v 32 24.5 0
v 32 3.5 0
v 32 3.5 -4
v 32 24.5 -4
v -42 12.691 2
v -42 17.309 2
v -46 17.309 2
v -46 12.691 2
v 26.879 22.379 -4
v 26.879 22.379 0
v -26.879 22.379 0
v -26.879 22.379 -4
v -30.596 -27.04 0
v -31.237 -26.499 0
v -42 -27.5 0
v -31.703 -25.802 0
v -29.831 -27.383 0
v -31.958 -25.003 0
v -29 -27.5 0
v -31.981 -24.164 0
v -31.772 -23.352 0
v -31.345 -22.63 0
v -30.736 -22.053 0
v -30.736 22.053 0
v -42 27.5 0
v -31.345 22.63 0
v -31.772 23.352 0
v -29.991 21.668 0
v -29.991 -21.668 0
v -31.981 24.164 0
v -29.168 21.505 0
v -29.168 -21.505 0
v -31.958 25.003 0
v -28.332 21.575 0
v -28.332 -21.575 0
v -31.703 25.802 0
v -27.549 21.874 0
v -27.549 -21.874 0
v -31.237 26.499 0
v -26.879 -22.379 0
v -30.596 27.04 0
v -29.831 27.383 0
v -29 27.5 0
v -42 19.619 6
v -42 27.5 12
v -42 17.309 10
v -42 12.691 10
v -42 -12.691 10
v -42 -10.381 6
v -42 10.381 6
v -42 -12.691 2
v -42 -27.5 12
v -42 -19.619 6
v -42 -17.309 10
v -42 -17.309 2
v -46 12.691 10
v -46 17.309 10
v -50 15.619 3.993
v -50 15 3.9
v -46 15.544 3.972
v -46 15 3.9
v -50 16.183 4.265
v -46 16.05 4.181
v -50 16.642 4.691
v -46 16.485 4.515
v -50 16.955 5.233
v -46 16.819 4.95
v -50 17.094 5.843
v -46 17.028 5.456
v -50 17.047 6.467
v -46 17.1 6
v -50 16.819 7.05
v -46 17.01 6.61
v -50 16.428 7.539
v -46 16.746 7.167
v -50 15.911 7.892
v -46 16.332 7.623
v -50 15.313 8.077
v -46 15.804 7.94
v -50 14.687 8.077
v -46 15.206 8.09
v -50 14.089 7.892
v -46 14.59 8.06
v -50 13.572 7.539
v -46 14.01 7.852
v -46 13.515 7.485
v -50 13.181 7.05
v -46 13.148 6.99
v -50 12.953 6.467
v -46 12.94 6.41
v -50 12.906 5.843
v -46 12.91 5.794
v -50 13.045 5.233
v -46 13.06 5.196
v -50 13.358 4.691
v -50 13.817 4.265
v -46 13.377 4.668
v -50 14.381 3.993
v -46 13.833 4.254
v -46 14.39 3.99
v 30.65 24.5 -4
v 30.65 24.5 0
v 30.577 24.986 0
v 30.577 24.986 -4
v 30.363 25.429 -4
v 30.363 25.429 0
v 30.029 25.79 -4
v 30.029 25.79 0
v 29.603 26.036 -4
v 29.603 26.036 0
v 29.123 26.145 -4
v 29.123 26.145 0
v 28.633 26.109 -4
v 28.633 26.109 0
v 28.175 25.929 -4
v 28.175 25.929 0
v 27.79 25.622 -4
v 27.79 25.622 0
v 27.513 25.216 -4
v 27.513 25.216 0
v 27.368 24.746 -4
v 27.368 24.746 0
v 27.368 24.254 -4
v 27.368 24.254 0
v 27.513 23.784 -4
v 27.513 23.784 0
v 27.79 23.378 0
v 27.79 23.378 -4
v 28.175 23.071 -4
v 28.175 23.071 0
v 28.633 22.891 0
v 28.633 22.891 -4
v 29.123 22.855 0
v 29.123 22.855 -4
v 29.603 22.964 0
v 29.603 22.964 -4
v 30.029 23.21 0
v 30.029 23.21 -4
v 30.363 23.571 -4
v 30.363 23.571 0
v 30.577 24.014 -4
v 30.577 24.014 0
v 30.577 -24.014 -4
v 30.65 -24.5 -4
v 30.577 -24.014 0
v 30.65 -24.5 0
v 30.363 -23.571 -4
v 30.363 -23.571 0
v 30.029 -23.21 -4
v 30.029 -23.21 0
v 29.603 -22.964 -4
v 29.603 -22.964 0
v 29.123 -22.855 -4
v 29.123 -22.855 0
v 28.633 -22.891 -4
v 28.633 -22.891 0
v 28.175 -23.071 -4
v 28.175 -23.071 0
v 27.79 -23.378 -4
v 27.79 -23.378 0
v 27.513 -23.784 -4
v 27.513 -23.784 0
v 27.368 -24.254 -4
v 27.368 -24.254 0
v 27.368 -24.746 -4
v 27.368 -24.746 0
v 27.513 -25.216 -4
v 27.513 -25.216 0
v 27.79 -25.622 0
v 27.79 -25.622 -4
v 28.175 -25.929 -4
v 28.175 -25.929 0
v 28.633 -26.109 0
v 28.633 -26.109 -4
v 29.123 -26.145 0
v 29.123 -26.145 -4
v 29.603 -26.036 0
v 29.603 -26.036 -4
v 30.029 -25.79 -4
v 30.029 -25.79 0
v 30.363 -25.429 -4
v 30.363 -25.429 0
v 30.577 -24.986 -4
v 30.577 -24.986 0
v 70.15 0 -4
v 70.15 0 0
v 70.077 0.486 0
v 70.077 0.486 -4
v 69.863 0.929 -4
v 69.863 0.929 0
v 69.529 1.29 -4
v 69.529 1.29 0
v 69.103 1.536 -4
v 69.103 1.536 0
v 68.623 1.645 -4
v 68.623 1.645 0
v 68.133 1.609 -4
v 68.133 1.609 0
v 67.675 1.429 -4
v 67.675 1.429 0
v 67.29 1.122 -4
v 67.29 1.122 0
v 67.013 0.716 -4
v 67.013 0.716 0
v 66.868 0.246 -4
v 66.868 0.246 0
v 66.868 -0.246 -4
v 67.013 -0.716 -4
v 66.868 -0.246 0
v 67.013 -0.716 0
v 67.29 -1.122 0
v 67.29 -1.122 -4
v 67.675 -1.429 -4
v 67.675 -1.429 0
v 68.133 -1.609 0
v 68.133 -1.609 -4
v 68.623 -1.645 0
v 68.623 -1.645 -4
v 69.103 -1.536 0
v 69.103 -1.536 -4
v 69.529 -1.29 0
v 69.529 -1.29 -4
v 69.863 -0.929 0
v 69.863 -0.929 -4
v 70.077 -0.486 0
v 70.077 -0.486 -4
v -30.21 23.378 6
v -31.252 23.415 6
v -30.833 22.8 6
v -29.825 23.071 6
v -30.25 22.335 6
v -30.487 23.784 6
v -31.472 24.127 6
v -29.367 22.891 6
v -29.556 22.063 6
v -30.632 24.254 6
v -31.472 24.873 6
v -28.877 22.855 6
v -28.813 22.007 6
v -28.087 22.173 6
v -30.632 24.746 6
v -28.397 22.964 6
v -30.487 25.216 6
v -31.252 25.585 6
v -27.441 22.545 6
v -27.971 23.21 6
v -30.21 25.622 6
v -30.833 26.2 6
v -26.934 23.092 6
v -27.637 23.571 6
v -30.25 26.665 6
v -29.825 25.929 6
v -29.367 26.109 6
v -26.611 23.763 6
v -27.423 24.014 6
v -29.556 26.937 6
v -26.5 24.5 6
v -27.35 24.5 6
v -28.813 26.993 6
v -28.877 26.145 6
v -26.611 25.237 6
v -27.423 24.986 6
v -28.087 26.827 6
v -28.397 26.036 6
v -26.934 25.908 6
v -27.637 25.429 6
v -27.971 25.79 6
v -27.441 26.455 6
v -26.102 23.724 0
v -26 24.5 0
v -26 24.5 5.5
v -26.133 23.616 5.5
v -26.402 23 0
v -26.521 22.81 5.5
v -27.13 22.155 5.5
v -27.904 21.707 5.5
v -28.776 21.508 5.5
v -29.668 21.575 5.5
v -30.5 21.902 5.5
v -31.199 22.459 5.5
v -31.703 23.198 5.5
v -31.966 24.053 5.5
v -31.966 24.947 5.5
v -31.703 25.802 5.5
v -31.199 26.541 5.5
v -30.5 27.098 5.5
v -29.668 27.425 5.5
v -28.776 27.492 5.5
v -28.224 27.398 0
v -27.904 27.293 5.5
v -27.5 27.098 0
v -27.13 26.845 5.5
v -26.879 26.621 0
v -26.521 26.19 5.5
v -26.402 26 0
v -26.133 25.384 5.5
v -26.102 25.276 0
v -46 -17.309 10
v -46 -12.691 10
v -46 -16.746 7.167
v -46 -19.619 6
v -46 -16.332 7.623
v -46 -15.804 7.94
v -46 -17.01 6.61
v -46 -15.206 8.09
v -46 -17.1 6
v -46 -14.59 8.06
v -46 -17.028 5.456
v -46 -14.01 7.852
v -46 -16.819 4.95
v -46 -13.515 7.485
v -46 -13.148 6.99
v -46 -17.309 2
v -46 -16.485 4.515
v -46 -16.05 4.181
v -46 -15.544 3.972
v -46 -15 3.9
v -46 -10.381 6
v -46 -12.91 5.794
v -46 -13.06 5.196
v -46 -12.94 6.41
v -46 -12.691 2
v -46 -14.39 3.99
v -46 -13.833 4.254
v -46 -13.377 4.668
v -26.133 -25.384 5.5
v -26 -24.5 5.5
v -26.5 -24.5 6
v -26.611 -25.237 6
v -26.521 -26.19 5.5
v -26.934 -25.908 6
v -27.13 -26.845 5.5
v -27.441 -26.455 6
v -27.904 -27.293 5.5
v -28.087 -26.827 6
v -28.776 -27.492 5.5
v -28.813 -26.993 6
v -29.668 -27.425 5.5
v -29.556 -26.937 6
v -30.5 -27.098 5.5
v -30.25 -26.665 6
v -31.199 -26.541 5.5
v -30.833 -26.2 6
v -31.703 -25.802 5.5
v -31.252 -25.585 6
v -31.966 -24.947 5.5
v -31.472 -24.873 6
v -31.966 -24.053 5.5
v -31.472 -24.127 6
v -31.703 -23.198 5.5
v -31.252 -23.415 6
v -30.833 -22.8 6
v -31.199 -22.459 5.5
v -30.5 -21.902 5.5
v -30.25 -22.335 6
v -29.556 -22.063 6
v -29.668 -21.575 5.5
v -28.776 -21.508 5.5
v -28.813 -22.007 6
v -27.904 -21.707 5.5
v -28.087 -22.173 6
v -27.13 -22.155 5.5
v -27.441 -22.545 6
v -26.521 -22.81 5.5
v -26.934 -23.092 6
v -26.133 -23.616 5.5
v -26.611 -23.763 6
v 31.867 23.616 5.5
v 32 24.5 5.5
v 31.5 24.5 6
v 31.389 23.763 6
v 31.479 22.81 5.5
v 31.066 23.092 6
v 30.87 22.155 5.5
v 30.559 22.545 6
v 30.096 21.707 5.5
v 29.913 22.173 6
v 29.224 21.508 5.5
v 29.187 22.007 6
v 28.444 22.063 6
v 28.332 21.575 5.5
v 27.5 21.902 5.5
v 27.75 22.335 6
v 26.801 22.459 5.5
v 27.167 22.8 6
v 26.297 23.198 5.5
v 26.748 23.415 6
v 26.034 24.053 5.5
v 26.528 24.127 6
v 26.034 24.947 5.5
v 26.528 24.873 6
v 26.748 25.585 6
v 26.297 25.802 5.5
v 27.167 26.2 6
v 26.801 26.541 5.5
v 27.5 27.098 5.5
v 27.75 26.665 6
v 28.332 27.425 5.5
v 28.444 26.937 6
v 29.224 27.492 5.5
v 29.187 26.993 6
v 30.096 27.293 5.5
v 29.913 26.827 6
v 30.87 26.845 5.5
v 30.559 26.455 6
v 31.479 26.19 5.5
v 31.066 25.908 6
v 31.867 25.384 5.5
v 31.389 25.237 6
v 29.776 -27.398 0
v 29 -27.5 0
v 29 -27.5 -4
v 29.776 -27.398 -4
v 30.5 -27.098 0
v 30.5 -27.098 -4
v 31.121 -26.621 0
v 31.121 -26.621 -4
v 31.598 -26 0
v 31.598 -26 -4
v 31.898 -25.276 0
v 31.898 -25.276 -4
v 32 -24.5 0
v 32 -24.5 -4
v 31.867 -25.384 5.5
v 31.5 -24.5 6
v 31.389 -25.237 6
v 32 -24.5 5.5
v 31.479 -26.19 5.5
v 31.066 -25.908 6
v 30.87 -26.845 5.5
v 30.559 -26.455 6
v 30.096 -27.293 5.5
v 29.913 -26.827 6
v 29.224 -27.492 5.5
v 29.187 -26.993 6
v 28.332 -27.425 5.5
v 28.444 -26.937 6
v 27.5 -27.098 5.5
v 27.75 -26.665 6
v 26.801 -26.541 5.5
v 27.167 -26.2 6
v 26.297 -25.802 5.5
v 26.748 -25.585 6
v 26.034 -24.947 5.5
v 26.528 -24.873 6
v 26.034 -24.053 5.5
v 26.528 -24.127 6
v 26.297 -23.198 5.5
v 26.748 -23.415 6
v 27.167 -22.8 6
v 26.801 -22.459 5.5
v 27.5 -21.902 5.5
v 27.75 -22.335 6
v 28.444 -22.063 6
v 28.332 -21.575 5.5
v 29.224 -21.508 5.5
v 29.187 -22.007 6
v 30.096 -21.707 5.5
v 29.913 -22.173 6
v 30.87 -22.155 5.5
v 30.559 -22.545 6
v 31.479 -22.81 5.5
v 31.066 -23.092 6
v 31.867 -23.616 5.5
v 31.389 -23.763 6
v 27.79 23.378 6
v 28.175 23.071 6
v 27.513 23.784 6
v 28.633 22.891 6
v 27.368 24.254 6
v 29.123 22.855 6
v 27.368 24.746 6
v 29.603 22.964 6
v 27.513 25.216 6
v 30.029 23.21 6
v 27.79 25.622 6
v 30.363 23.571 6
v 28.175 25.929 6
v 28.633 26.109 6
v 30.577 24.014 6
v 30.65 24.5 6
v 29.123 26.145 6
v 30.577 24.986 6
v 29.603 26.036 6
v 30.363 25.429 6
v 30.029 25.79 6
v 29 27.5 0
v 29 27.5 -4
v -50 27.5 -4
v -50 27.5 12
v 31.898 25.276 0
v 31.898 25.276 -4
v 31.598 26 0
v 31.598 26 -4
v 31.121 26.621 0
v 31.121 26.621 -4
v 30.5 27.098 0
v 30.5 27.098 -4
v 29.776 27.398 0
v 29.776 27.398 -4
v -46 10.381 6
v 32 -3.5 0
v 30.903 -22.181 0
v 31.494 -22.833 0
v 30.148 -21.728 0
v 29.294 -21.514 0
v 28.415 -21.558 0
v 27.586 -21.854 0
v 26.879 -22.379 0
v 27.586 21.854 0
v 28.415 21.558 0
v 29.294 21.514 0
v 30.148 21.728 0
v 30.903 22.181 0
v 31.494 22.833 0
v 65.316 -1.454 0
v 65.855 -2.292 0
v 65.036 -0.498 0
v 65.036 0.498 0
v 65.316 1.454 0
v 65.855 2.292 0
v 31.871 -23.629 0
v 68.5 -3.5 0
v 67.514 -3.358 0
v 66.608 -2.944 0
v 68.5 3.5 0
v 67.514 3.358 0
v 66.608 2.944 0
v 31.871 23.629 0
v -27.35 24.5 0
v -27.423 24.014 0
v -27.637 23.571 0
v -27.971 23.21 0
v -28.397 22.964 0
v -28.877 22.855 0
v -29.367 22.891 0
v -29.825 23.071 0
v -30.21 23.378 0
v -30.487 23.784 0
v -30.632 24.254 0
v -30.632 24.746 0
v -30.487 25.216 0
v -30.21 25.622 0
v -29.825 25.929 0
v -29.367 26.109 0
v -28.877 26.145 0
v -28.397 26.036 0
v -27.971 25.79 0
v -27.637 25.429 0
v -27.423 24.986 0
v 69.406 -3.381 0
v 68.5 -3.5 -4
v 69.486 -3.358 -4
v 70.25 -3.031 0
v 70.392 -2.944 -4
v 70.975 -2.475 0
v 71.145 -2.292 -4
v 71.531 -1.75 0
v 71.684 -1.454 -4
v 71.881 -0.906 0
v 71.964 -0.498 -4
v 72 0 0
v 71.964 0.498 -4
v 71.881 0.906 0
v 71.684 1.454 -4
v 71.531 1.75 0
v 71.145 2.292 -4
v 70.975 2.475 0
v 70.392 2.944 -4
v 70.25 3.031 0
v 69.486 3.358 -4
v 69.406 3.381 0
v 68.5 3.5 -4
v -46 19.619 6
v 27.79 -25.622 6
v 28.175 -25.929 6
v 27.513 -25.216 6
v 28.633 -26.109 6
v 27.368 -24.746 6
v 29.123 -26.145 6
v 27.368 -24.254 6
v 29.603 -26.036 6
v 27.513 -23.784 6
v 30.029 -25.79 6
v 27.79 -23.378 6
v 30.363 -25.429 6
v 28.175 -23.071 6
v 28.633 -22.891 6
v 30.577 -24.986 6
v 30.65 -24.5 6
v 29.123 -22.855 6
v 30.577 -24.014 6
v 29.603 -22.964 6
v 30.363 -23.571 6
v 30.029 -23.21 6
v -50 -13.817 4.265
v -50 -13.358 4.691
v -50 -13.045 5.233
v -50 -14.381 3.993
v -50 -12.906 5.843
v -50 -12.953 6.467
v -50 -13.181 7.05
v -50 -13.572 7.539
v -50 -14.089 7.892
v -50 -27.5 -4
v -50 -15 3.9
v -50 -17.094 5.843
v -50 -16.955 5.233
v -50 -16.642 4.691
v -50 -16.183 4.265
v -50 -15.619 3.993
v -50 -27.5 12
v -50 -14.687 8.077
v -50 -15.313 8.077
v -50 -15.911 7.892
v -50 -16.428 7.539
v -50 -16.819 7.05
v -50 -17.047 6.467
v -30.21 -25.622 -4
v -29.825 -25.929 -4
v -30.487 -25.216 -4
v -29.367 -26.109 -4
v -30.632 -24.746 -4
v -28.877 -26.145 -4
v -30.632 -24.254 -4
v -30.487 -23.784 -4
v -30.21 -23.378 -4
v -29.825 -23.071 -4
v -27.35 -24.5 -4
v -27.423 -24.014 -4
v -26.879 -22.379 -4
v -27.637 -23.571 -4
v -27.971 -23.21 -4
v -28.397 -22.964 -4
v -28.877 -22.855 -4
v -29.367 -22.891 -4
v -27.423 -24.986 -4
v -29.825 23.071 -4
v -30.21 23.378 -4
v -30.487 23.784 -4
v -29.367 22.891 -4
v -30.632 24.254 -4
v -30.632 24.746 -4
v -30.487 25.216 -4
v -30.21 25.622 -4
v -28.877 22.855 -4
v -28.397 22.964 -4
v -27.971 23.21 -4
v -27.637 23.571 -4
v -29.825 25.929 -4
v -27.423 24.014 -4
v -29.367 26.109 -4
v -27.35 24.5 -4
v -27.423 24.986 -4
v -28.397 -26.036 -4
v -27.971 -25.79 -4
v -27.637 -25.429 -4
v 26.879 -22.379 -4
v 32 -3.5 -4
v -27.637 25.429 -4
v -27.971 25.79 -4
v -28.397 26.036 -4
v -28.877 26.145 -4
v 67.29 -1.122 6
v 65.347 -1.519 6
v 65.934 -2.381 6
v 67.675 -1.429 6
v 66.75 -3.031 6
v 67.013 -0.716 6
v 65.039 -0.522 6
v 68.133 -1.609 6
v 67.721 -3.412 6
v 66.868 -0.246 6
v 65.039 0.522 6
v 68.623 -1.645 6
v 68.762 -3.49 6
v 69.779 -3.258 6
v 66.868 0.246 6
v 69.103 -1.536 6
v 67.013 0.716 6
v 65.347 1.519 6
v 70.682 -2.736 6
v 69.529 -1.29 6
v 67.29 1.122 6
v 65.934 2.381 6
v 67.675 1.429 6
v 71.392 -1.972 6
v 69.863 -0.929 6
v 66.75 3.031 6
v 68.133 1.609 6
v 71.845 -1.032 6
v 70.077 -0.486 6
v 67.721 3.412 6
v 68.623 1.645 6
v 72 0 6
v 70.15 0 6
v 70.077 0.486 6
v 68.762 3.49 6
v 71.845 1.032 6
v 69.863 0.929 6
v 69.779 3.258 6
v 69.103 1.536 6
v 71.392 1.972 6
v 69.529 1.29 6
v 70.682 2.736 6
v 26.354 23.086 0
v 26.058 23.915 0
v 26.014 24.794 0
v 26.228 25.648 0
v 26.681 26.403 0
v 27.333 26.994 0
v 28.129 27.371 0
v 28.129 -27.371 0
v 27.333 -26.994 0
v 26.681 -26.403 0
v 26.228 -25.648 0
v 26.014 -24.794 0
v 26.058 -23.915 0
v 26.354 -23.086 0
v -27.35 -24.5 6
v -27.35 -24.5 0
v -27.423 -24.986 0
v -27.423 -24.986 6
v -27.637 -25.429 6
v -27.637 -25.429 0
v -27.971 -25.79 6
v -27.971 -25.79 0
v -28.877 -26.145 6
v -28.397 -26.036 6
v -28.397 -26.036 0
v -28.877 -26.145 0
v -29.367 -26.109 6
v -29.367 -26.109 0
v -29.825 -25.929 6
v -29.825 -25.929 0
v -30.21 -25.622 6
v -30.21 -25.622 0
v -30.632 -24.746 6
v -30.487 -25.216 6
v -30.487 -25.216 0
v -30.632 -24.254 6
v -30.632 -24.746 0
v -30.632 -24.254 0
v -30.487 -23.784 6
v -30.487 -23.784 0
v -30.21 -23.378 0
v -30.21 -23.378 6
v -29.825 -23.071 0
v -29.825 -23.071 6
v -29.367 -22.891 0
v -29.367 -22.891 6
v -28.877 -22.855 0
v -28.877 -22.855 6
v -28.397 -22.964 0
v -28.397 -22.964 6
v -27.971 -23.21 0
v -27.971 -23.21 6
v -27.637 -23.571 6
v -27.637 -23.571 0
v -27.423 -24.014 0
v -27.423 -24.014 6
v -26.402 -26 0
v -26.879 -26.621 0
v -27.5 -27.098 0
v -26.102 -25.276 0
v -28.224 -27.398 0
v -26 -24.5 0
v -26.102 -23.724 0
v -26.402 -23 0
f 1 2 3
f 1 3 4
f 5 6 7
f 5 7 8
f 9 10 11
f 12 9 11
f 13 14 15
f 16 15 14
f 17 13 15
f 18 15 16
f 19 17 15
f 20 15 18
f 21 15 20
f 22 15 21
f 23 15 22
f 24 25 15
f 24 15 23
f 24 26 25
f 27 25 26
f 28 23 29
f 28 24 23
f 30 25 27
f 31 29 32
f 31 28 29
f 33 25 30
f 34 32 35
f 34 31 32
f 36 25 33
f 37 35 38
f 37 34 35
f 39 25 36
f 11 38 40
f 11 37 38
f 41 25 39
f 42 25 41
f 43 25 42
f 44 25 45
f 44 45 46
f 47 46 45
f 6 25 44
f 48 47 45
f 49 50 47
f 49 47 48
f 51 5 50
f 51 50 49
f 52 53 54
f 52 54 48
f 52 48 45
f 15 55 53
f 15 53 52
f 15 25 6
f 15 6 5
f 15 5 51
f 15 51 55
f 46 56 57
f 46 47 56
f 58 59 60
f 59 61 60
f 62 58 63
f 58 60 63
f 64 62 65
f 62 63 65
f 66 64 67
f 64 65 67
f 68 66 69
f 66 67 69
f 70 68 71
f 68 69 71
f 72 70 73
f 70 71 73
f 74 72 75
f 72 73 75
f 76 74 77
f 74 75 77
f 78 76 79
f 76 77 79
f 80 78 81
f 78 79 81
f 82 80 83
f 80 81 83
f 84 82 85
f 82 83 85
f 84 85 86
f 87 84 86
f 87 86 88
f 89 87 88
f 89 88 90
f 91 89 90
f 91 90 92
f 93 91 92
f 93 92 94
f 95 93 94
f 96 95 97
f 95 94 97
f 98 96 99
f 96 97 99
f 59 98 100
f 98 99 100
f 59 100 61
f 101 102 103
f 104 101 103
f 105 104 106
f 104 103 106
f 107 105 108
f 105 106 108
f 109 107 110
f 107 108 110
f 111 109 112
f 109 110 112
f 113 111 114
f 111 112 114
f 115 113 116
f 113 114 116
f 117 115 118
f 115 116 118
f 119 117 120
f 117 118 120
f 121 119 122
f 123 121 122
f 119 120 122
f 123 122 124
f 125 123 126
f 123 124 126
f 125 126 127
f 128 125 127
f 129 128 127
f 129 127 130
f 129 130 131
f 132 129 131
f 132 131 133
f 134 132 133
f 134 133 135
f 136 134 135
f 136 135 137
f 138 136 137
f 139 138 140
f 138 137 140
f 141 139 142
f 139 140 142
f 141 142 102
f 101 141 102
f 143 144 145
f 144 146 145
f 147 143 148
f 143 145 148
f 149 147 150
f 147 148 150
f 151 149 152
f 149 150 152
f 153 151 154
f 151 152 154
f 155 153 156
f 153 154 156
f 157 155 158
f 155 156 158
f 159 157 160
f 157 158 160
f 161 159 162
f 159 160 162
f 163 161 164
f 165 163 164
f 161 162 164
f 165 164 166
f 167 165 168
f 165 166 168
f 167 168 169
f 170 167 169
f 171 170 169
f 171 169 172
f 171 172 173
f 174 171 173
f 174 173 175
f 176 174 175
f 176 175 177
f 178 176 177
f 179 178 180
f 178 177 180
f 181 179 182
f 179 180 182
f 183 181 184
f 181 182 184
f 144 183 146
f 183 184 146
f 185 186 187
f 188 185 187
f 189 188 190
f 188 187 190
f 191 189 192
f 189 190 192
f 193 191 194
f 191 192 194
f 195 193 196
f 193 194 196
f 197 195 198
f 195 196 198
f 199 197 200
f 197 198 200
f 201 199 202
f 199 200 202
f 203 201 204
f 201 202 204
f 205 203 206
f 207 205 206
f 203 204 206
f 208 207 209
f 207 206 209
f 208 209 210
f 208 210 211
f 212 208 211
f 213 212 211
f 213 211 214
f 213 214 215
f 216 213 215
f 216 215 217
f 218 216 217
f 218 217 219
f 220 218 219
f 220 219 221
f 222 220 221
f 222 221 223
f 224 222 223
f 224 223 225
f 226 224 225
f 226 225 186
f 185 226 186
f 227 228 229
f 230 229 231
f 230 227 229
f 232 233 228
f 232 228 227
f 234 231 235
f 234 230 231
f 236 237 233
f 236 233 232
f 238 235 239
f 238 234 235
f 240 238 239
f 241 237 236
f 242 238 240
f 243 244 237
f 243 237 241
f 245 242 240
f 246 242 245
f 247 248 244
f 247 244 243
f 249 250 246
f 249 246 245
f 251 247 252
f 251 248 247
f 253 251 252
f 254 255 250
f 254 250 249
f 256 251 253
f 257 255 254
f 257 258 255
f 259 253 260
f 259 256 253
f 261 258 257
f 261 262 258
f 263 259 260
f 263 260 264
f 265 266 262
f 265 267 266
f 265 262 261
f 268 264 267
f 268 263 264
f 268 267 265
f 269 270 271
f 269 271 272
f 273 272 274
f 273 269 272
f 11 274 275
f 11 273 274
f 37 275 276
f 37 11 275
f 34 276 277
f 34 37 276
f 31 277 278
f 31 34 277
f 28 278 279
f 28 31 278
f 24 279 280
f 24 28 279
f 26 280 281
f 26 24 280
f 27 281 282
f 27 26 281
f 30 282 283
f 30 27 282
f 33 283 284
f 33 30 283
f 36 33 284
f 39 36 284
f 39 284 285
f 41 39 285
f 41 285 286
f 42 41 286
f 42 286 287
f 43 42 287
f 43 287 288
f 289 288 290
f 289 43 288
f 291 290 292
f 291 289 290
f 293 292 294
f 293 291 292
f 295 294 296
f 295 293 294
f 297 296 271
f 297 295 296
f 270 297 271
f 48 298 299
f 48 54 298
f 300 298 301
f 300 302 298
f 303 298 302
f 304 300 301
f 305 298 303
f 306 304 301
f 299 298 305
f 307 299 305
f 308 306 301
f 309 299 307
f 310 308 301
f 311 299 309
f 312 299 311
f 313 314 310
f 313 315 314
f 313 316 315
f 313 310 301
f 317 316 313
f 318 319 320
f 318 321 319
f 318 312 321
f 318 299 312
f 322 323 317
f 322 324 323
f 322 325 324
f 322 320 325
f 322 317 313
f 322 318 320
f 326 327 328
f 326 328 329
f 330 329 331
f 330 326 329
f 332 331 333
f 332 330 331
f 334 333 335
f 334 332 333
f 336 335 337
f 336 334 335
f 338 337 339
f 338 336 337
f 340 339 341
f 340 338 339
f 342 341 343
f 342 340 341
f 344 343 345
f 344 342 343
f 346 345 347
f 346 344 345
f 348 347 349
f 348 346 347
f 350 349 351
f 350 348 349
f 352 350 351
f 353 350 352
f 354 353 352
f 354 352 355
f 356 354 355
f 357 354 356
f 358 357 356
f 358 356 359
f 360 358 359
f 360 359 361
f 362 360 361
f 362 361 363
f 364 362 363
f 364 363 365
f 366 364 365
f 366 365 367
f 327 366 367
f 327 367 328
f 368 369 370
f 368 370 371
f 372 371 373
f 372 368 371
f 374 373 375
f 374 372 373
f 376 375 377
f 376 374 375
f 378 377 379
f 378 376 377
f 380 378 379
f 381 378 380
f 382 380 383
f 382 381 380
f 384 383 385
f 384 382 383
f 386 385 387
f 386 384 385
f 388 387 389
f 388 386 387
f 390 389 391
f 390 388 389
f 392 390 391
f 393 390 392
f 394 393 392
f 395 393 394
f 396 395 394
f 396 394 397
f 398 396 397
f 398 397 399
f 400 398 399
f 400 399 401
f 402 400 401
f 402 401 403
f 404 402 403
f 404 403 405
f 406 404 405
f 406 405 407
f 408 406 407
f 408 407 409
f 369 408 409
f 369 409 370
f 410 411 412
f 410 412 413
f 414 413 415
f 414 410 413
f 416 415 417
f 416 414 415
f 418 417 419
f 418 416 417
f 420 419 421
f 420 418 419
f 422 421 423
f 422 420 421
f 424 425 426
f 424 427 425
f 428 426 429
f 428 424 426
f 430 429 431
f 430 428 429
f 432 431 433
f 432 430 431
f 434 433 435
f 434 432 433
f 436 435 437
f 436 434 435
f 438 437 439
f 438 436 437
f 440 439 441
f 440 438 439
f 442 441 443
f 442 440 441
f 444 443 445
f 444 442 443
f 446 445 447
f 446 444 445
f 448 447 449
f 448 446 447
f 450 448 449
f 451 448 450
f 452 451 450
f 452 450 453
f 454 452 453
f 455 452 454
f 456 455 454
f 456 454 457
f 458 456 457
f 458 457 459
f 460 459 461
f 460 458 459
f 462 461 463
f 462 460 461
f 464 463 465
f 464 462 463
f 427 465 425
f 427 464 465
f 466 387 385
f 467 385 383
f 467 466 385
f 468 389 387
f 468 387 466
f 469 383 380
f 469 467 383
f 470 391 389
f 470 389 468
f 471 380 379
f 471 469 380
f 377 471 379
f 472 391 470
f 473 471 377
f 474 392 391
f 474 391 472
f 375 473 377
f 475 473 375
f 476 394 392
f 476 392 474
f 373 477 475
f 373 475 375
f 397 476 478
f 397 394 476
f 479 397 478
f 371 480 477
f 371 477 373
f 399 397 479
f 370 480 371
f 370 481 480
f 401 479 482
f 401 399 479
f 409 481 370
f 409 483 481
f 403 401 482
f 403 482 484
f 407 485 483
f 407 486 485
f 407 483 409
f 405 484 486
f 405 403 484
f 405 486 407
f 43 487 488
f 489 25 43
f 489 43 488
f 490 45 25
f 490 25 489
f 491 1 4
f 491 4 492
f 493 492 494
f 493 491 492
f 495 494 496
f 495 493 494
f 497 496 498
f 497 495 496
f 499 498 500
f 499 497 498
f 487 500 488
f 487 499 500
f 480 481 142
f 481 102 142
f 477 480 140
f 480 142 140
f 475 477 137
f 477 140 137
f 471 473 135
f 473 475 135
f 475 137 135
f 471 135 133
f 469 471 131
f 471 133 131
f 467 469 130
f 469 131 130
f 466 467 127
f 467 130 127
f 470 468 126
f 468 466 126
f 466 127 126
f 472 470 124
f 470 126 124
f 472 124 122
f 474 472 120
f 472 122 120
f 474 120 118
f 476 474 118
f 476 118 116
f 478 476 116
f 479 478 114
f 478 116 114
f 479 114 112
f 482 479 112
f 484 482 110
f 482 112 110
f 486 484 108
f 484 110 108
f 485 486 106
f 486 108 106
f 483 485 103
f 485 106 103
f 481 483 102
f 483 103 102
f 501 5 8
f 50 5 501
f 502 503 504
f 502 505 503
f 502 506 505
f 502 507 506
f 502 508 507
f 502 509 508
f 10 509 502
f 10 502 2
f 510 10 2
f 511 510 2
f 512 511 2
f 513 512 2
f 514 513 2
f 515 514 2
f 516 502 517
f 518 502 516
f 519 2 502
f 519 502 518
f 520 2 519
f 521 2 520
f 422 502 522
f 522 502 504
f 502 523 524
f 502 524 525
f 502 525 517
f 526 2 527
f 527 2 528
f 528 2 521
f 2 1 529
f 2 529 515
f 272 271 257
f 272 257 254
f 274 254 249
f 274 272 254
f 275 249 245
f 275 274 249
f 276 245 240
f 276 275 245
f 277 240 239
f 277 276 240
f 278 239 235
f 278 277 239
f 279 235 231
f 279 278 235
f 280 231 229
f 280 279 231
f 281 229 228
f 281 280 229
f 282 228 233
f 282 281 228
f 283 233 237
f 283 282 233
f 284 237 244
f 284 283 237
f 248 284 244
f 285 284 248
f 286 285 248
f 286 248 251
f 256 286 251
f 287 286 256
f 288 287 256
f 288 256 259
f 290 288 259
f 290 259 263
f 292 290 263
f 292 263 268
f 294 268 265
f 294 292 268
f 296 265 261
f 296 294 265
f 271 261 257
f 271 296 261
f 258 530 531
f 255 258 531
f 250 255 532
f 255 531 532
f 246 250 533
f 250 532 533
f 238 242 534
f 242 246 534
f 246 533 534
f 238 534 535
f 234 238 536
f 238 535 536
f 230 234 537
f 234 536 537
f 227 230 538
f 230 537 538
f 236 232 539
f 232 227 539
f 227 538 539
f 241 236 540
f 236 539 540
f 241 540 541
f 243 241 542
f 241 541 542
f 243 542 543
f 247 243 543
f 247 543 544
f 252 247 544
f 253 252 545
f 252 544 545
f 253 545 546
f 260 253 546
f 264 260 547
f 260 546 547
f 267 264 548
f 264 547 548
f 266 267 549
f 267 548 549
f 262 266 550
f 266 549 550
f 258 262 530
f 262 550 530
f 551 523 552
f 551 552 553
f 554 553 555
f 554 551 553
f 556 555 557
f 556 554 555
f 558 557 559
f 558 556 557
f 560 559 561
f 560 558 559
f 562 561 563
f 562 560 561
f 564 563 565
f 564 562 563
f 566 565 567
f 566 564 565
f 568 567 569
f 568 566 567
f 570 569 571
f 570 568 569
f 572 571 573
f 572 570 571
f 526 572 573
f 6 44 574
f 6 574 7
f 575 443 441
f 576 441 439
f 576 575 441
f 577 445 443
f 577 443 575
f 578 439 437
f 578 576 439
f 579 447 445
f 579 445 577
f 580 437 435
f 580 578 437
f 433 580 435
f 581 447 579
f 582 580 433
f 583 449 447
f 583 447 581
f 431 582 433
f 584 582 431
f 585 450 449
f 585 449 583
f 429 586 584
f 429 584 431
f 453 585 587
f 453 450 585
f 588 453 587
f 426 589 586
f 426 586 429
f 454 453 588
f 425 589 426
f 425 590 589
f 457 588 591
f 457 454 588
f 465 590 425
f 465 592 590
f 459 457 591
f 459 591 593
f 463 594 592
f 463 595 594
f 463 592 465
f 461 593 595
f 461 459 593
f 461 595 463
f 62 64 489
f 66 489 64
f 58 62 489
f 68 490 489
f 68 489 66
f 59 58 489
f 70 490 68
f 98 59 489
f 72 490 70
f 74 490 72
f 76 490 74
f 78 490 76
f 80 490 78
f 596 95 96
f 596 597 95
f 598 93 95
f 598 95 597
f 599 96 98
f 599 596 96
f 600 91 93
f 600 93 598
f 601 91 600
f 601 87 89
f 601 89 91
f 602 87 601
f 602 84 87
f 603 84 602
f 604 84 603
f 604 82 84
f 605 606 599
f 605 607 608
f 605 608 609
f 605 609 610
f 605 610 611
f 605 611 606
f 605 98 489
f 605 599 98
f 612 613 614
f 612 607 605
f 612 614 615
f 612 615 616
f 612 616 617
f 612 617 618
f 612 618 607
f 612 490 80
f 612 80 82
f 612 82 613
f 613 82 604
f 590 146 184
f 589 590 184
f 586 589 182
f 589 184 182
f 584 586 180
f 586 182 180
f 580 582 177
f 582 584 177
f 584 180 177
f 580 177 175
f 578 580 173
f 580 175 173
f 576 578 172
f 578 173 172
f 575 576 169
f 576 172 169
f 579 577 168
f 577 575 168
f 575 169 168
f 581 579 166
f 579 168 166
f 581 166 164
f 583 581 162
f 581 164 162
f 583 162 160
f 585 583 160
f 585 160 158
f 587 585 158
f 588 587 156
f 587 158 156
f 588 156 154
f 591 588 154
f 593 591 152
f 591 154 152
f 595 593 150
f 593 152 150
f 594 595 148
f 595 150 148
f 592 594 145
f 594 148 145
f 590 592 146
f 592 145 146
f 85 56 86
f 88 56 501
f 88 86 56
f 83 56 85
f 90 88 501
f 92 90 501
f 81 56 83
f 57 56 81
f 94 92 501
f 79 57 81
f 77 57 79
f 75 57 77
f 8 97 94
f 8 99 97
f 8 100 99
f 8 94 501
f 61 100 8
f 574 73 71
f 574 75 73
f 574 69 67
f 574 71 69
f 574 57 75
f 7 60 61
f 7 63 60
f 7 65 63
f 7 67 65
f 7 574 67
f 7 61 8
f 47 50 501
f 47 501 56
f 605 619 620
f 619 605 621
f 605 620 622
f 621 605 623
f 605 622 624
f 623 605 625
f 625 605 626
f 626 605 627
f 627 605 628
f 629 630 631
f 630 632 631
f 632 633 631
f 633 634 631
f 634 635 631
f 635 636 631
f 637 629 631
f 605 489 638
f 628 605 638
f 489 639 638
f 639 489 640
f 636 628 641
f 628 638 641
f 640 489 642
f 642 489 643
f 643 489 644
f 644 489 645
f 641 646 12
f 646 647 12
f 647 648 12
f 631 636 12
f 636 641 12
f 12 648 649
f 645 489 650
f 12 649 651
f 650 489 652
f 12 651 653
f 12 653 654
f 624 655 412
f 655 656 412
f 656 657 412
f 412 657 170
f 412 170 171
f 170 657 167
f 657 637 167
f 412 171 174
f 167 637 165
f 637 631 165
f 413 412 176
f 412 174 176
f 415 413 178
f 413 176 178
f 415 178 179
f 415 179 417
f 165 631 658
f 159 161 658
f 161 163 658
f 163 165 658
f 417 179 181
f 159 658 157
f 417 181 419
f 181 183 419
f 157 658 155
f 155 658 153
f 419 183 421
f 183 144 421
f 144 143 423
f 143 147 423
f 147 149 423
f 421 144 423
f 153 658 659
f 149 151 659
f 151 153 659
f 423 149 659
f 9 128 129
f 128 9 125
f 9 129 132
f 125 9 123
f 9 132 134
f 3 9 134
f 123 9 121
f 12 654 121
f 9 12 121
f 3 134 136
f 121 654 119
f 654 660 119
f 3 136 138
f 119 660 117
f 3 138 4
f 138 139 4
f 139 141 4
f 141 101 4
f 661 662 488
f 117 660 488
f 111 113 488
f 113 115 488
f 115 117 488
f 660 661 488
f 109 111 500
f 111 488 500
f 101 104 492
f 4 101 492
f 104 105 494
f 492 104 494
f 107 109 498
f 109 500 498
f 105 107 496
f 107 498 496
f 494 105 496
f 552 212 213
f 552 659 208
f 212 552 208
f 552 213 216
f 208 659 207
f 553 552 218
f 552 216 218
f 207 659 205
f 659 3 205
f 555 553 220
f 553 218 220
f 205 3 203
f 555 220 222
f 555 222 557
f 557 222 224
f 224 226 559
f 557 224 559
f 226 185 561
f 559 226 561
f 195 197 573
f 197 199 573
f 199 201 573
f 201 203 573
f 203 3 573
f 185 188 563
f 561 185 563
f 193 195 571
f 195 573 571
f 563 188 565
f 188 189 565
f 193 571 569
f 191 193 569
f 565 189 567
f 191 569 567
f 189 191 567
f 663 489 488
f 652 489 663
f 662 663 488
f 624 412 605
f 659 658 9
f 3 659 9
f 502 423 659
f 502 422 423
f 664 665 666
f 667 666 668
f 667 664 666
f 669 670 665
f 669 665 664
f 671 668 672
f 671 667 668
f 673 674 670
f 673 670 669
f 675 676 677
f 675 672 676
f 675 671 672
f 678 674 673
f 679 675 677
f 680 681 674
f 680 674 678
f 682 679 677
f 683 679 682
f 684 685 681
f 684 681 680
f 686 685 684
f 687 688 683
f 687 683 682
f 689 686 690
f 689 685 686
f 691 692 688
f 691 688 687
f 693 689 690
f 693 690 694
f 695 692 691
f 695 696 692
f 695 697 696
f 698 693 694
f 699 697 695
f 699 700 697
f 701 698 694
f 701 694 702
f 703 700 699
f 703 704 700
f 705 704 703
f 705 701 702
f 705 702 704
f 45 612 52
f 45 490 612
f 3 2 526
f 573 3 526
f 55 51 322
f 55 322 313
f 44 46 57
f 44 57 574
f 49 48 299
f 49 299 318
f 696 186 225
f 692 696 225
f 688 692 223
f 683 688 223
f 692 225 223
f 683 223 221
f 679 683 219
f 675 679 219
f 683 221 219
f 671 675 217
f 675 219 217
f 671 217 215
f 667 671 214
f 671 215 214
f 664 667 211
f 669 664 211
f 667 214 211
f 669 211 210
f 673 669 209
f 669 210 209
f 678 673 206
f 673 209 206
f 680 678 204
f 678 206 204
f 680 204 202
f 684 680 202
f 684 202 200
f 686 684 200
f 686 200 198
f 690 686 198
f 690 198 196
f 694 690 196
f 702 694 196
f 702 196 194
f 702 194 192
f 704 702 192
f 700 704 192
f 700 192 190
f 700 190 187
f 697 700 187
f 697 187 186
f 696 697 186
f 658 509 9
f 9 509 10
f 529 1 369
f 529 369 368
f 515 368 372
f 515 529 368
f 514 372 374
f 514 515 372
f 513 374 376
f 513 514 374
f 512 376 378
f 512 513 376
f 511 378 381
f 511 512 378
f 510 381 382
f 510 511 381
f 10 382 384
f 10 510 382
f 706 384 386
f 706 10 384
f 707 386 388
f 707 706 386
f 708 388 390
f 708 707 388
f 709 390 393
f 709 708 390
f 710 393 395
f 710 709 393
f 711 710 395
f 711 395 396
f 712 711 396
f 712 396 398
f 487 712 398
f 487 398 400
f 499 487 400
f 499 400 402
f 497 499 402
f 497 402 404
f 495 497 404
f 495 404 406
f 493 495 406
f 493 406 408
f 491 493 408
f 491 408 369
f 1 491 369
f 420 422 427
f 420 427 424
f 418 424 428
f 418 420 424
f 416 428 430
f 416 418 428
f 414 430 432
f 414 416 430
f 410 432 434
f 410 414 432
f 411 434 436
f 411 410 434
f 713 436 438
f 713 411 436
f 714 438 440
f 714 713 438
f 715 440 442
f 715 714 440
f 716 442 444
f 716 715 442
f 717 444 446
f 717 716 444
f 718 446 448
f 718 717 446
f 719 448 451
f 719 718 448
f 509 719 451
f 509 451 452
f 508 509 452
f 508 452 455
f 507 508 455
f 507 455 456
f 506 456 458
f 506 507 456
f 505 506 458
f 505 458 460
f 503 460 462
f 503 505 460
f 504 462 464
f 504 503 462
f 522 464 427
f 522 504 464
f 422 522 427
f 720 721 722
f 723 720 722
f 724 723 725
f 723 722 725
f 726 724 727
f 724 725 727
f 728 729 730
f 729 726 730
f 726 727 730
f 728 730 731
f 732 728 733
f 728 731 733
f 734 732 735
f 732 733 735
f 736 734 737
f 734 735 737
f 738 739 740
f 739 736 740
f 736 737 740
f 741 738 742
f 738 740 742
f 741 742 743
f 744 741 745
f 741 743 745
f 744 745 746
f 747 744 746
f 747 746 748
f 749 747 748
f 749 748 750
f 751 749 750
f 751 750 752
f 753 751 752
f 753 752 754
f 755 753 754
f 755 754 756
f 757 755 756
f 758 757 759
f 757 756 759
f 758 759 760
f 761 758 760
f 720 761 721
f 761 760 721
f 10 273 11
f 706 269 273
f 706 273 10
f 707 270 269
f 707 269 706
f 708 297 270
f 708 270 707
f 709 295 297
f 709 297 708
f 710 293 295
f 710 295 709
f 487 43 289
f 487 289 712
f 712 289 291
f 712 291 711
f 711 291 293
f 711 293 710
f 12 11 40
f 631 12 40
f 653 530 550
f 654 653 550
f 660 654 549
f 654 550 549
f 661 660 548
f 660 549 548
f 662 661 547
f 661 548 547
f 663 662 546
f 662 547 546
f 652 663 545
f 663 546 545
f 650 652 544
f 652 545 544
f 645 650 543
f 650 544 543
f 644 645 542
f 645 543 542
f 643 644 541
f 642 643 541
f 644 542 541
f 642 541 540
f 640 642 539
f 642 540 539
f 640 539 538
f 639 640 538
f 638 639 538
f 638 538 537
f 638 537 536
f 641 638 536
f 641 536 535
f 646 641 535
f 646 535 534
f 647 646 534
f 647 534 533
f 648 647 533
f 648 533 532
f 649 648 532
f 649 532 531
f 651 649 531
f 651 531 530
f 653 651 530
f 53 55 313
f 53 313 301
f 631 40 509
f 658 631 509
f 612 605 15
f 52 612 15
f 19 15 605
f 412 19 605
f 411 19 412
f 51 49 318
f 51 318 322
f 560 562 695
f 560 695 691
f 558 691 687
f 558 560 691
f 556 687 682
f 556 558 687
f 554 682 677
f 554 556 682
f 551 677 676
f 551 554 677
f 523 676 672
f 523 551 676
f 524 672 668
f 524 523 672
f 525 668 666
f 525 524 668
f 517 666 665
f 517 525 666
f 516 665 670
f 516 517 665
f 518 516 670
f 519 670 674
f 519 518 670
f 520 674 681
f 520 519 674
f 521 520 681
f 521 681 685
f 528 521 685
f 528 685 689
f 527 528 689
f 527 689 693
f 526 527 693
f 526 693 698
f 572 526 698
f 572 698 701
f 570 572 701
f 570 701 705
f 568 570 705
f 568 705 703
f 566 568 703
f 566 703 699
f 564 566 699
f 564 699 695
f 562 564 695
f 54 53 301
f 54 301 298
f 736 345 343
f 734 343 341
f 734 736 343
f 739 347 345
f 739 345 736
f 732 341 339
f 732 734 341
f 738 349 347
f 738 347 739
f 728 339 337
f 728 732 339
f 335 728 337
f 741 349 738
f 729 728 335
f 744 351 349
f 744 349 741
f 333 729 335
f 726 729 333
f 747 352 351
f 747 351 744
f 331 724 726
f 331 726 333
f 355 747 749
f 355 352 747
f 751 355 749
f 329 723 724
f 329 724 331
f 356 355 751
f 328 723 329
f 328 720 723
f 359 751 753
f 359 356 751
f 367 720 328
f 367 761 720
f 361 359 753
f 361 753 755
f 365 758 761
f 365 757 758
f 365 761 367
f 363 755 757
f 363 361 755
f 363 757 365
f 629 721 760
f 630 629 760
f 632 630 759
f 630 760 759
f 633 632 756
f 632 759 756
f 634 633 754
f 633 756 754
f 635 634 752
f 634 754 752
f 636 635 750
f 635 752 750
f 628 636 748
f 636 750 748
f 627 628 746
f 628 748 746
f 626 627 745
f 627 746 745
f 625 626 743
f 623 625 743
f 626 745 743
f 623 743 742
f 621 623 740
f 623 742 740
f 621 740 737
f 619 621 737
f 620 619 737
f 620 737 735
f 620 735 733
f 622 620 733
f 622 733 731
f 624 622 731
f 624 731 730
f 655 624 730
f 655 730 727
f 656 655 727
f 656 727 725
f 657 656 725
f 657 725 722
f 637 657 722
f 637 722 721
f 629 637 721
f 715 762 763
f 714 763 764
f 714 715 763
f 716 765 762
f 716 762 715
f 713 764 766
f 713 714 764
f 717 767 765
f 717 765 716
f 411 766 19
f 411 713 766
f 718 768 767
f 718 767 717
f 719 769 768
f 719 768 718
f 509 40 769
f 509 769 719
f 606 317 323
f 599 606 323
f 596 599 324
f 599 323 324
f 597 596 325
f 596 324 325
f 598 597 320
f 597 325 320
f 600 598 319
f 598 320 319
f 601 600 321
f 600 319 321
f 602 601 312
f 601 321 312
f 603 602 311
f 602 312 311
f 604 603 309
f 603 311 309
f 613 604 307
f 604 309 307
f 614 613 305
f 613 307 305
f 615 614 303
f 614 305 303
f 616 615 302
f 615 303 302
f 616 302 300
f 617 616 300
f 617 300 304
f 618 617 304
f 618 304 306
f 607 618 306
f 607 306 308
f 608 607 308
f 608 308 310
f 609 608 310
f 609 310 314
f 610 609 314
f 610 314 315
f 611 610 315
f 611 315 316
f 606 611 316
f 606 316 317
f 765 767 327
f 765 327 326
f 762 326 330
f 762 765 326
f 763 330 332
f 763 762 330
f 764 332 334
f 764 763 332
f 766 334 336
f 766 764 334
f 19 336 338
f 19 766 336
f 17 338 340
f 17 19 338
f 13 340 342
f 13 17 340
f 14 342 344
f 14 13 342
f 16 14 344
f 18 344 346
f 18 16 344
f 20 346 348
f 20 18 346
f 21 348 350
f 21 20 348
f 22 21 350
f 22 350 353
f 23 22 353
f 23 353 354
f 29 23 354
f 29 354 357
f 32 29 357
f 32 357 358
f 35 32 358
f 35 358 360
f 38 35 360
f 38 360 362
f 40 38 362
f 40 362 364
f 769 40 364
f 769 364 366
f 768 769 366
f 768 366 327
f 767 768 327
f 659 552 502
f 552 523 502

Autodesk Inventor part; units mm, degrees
ref_plane "YZ Plane" through (0, 0, 0) normal (1, 0, 0) x (0, 1, 0)
ref_plane "XZ Plane" through (0, 0, 0) normal (0, 1, 0) x (-1, 0, 0)
ref_plane "XY Plane" through (0, 0, 0) normal (0, 0, 1) x (1, 0, 0)
sketch "Esquisse1" plane through (0, 0, 0) normal (0, 0, 1) x (1, 0, 0)
  line L0 (-29, 24.5) -> (29, 24.5) construction
  line L1 (29, 24.5) -> (29, -24.5) construction
  line L2 (29, -24.5) -> (-29, -24.5) construction
  line L3 (-29, -24.5) -> (-29, 24.5) construction
  line L4 (-29, 24.5) -> (29, -24.5) construction
  line L5 (29, 24.5) -> (-29, -24.5) construction
  circle A0 centre (29, 24.5) radius 1.65
  circle A1 centre (-29, 24.5) radius 1.65
  circle A2 centre (-29, -24.5) radius 1.65
  circle A3 centre (29, -24.5) radius 1.65
  circle A4 centre (29, 24.5) radius 3
  circle A5 centre (-29, 24.5) radius 3
  circle A6 centre (-29, -24.5) radius 3
  circle A7 centre (29, -24.5) radius 3
  line L6 (-42, -27.5) -> (-32, -27.5)
  line L7 (-32, -27.5) -> (-32, 27.5)
  line L8 (-32, 27.5) -> (-42, 27.5)
  line L9 (-42, 27.5) -> (-42, -27.5)
  line L10 (-42, -27.5) -> (-32, 27.5) construction
  line L11 (-32, -27.5) -> (-42, 27.5) construction
  line L12 (-50, -27.5) -> (-42, -27.5)
  line L13 (-42, -27.5) -> (-42, 27.5)
  line L14 (-42, 27.5) -> (-50, 27.5)
  line L15 (-50, 27.5) -> (-50, -27.5)
  line L16 (-50, -27.5) -> (-42, 27.5) construction
  line L17 (-42, -27.5) -> (-50, 27.5) construction
  line L18 (-74.4, 0) -> (96.4, 0) projected
  line L19 (-32, -27.5) -> (32, -27.5)
  line L20 (32, -27.5) -> (32, 27.5)
  line L21 (32, 27.5) -> (-32, 27.5)
  line L22 (-32, 27.5) -> (-32, -27.5)
  line L23 (-32, -27.5) -> (32, 27.5) construction
  line L24 (32, -27.5) -> (-32, 27.5) construction
  line L25 (26.8787, 22.3787) -> (-26.8787, 22.3787)
  line L26 (-26.8787, 22.3787) -> (-26.8787, -22.3787)
  line L27 (-26.8787, -22.3787) -> (26.8787, -22.3787)
  line L28 (26.8787, -22.3787) -> (26.8787, 22.3787)
  line L29 (26.8787, 22.3787) -> (-26.8787, -22.3787) construction
  line L30 (-26.8787, 22.3787) -> (26.8787, -22.3787) construction
  line L31 (26.8787, 0) -> (32, 0) construction
  line L32 (0, -22.3787) -> (0, -27.5) construction
  line L33 (72, -3.5) -> (32, -3.5)
  line L34 (32, -3.5) -> (32, 3.5)
  line L35 (32, 3.5) -> (72, 3.5)
  line L36 (72, 3.5) -> (72, -3.5)
  line L37 (72, -3.5) -> (32, 3.5) construction
  line L38 (32, -3.5) -> (72, 3.5) construction
  circle A8 centre (68.5, 0) radius 3.5
  circle A9 centre (68.5, 0) radius 1.65
  point P0 (0, 0)
  point P1 (-29, 0)
  point P2 (0, -24.5)
  point P3 (-37, 0)
  point P4 (-46, 0)
  point P5 (-32, 0)
  point P6 (-29, -27.5)
  point P7 (29, -27.5)
  point P8 (32, -24.5)
  point P9 (-29, 27.5)
  point P10 (-32, 24.5)
  point P11 (-32, -24.5)
  point P12 (32, 24.5)
  point P13 (29, 27.5)
  point P14 (52, 0)
  point P15 (68.5, -3.5)
  point P16 (68.5, 3.5)
  dimension "d3" = 6
  dimension "d0" = 49
  dimension "d1" = 58
  dimension "d2" = 3.3
  dimension "d32" = 10
  dimension "d33" = 8
  dimension "d49" = 7
  dimension "d50" = 40
extrude "Extrusion1" add sketch "Esquisse1" against normal blind 4 contours A4 | L25 A5 L21 A4 | A4 L20 L18 L28 | A5 | L26 L18 L7 A5 | L18 L20 A7 L28 | L35 A8 L18 L20 | A5 L7 L21 | L7 L18 L9 L8 | L26 A6 L7 L18 | L18 A8 L33 L20 | A7 | A7 L19 A6 L27 | A8 L18 A9 | L7 L6 L9 L18 | A6 | L18 A9 A8 | L9 L18 L15 L14 | A6 L19 L7 | L9 L12 L15 L18
extrude "Extrusion10" add sketch "Esquisse1" along normal blind 12 contours L9 L18 L15 L14 | L9 L12 L15 L18
extrude "Extrusion11" add sketch "Esquisse1" along normal blind 6 contours A4 | A5 | A7 | A8 L18 A9 | A6 | L18 A9 A8
sketch "Esquisse13" plane through (-42, -27.5, 0) normal (1, 0, 0) x (0, 0, -1)
  line L0 (0, 55) -> (0, 0) projected
  line L1 (0, 55) -> (-12, 55) projected
  line L2 (-12, 0) -> (-12, 55) projected
  line L3 (0, 0) -> (-12, 0) projected
  line L4 (0, 0) -> (-12, 0) projected
  line L5 (-6, 0) -> (-6, 12.5)
  line L6 (-6, 12.5) -> (-6, 42.5) construction
  line L7 (-6, 42.5) -> (-6, 55)
  line L8 (0, 55) -> (-12, 55) projected
  circle A0 centre (-6, 12.5) radius 2.1
  circle A1 centre (-6, 42.5) radius 2.1
  line L9 (-2, 14.8094) -> (-2, 10.1906)
  line L10 (-2, 10.1906) -> (-6, 7.8812)
  line L11 (-6, 7.8812) -> (-10, 10.1906)
  line L12 (-10, 10.1906) -> (-10, 14.8094)
  line L13 (-10, 14.8094) -> (-6, 17.1188)
  line L14 (-6, 17.1188) -> (-2, 14.8094)
  line L15 (-6, 37.8812) -> (-10, 40.1906)
  line L16 (-10, 40.1906) -> (-10, 44.8094)
  line L17 (-10, 44.8094) -> (-6, 47.1188)
  line L18 (-6, 47.1188) -> (-2, 44.8094)
  line L19 (-2, 44.8094) -> (-2, 40.1906)
  line L20 (-2, 40.1906) -> (-6, 37.8812)
  point P0 (-10, 42.5)
  dimension "d38" = 4.2
  dimension "d39" = 8
  dimension "d41" = 30
extrude "Extrusion12" cut sketch "Esquisse13" against normal through all contours A1 | A0
extrude "Extrusion13" cut sketch "Esquisse13" against normal blind 4 contours L18 L19 L20 L15 L16 L17 | L11 L12 L13 L14 L9 L10
chamfer "Chanfrein2" distance 0.5 angle 45 4 edges at (-32, -24.5, 6) (26, -24.5, 6) (26, 24.5, 6) (-32, 24.5, 6)
properties part number "Support_Raspberry"
